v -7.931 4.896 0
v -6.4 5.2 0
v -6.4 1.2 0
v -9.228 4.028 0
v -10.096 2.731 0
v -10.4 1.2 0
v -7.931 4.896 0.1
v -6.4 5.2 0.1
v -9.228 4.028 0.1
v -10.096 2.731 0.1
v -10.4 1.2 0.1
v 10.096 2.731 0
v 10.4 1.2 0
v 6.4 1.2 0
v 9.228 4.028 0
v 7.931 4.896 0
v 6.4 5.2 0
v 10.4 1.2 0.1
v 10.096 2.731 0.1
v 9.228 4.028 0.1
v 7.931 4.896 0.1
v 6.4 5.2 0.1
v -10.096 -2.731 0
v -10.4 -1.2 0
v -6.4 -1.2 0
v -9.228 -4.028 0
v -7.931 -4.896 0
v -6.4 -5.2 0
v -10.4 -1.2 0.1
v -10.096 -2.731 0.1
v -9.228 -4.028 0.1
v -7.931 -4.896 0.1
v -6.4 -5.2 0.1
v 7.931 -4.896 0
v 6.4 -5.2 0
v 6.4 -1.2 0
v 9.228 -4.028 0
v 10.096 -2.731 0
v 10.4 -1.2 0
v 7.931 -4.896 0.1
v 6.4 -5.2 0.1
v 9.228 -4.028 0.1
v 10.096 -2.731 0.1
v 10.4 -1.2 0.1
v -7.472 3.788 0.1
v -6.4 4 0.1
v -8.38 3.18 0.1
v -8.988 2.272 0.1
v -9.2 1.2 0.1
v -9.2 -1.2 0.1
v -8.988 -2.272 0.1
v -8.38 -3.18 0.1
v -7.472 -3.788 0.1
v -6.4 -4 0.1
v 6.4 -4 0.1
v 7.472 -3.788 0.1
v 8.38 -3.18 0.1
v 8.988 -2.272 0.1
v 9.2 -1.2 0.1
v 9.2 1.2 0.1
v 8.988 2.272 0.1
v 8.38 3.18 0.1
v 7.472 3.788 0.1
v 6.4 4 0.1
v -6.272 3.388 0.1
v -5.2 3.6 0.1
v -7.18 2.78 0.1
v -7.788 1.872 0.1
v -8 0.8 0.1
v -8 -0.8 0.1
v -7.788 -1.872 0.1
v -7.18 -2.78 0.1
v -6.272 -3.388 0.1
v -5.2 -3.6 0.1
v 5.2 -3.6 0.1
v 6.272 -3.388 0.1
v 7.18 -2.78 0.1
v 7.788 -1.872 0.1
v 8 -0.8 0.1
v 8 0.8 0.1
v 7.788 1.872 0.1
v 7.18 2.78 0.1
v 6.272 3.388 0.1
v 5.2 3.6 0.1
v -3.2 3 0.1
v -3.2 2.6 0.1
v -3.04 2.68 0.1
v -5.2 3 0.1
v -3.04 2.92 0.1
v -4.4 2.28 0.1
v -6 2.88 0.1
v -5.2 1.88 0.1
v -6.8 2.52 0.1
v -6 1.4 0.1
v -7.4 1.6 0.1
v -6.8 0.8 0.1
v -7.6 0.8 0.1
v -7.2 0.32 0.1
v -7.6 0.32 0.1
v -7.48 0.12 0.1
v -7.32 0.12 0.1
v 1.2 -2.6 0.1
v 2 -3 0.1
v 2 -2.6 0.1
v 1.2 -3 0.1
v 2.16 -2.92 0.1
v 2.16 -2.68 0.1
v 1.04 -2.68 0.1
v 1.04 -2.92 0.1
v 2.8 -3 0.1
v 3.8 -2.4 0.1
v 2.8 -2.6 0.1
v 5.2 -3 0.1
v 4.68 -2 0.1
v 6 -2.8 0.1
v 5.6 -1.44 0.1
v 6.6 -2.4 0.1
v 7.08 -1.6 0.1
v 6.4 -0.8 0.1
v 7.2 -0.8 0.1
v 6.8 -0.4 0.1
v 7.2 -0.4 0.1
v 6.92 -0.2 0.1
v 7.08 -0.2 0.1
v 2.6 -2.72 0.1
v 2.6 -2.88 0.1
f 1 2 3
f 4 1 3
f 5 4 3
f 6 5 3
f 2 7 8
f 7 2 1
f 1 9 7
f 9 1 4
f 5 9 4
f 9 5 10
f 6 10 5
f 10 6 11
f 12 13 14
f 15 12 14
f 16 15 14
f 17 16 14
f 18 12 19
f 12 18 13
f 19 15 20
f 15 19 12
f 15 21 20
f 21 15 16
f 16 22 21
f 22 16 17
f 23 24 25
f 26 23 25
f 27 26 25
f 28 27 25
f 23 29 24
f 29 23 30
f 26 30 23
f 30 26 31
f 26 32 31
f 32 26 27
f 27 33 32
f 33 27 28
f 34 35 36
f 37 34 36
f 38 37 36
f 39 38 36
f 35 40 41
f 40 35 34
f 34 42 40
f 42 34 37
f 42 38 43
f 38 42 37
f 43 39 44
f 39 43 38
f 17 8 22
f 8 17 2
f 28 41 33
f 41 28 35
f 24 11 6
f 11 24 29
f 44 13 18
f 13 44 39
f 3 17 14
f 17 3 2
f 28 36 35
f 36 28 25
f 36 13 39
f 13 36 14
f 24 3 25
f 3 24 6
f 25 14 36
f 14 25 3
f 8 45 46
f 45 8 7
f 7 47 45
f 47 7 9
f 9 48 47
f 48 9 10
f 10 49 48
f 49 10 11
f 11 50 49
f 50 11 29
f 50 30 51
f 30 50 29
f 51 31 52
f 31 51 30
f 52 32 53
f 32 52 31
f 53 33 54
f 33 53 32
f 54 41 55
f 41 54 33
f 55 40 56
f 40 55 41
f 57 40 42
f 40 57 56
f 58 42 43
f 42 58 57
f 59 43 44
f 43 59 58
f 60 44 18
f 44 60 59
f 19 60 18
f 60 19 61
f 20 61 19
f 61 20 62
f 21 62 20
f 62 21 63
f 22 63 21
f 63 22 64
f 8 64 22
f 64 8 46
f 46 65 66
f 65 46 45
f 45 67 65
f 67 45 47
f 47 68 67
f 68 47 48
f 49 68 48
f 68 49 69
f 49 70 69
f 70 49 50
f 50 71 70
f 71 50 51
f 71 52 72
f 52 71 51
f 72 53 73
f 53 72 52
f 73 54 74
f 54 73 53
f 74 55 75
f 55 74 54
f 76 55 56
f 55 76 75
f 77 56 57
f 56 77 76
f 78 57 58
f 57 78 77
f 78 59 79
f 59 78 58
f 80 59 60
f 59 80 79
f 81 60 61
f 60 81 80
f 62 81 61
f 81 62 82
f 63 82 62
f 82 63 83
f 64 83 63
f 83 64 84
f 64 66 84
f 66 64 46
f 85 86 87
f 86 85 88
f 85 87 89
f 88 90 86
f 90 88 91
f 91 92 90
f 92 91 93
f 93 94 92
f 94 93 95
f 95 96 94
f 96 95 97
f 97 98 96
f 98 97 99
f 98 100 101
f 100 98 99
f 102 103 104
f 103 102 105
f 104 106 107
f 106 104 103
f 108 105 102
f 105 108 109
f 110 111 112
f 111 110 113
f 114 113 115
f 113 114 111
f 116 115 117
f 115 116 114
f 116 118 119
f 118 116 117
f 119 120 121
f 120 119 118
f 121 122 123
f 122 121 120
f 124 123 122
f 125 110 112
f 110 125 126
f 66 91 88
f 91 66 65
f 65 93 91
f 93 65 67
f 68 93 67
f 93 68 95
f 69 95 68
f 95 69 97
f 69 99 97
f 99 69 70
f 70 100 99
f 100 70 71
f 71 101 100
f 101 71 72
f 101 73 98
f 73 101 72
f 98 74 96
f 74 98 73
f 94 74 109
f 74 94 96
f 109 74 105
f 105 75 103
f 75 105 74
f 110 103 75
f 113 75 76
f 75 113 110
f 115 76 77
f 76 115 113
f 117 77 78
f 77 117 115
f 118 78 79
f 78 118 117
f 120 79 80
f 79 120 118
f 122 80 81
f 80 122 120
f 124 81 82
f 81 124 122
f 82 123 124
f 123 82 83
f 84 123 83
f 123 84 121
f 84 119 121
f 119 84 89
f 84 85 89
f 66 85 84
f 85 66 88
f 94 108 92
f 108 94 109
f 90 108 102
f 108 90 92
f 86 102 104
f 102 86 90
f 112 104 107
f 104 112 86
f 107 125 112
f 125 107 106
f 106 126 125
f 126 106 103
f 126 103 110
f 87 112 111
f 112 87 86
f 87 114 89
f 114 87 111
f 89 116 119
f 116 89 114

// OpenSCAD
// file: ../p/empty.scad
use <../lib.scad>
function ldraw_lib__empty() = [
// 0 Empty
// 0 Name: empty.dat
// 0 Author: Steffen [Steffen]
// 0 !LDRAW_ORG Primitive UPDATE 2015-01
// 0 !LICENSE Licensed under CC BY 4.0 : see CAreadme.txt
// 
// 0 BFC CERTIFY CCW
  [0,"BFC","CERTIFY"],
  [0,"BFC","CCW"],
// 
// 0 !HISTORY 2015-10-11 [PTadmin] Official Update 2015-01
// 
// 
// 0 // Tool MLCad cannot handle really empty files. This file is used as a workaround.
// 0 // It exceptionally contains forbidden non-LDRAW standard syntax to satisfy MLCad until it is fixed OR a different editor has become the de-facto LDRAW standard.
// 0 // The line being used here is an "impossible" conditional line which never should be visible,
// 0 // additionally hidden by a syntax explicitly hiding it from displaying.
// 
// 0 MLCAD HIDE 5 24 0 0 0 0.0001 0 0 0.0001 -0.0001 0 0 0 0
];
module ldraw_lib__empty(step=0, col=false, unit=2/5, alt=false, line=0.2, solid=!$preview)
    makepoly(ldraw_lib__empty(), step=step, col=col, unit=unit, alt=alt, line=line, solid=solid);
ldraw_lib__empty(line=0.2);
// file: ../p/1-16chrd.scad
use <../lib.scad>
use <empty.scad>
function ldraw_lib__1_16chrd() = [
// 0 Chord 0.0625
// 0 Name: 1-16chrd.dat
// 0 Author: Philippe Hurbain [Philo]
// 0 !LDRAW_ORG Primitive UPDATE 2015-01
// 0 !LICENSE Licensed under CC BY 4.0 : see CAreadme.txt
// 
// 0 BFC CERTIFY CCW
  [0,"BFC","CERTIFY"],
  [0,"BFC","CCW"],
// 
// 0 !HISTORY 2015-10-11 [PTadmin] Official Update 2015-01
// 
// 
// 0 // This file is intentionally empty because at the current \P resolution,
// 0 // an 1-16chrd is actually empty. However, this file still is present
// 0 // to allow tools to do primitives substition and fill in a real chrd here,
// 0 // or, if desired, to substitute this with the hi-res 48\1-16chrd.
// 
// 0 // This file is based on an idea by Darats at http://forums.ldraw.org/read.php?19,14500,14500#msg-14500
// 
// 1 16 0 0 0 1 0 0 0 1 0 0 0 1 empty.dat
  [1,16,0,0,0,1,0,0,0,1,0,0,0,1, ldraw_lib__empty()],
];
module ldraw_lib__1_16chrd(step=0, col=false, unit=2/5, alt=false, line=0.2, solid=!$preview)
    makepoly(ldraw_lib__1_16chrd(), step=step, col=col, unit=unit, alt=alt, line=line, solid=solid);
ldraw_lib__1_16chrd(line=0.2);
// file: ../p/1-4disc.scad
use <../lib.scad>
function ldraw_lib__1_4disc() = [
// 0 Disc 0.25
// 0 Name: 1-4disc.dat
// 0 Author: James Jessiman
// 0 !LDRAW_ORG Primitive UPDATE 2002-02
// 0 !LICENSE Licensed under CC BY 4.0 : see CAreadme.txt
// 
// 0 BFC CERTIFY CCW
  [0,"BFC","CERTIFY"],
  [0,"BFC","CCW"],
// 
// 0 !HISTORY 2002-03-23 [sbliss] Added BFC statement.
// 0 !HISTORY 2002-04-25 [PTadmin] Official Update 2002-02
// 0 !HISTORY 2007-06-22 [PTadmin] Header formatted for Contributor Agreement
// 0 !HISTORY 2008-07-01 [PTadmin] Official Update 2008-01
// 
// 
// 3 16 0 0 0 1 0 0 0.9239 0 0.3827
  [3,16,0,0,0,1,0,0,0.9239,0,0.3827],
// 3 16 0 0 0 0.9239 0 0.3827 0.7071 0 0.7071
  [3,16,0,0,0,0.9239,0,0.3827,0.7071,0,0.7071],
// 3 16 0 0 0 0.7071 0 0.7071 0.3827 0 0.9239
  [3,16,0,0,0,0.7071,0,0.7071,0.3827,0,0.9239],
// 3 16 0 0 0 0.3827 0 0.9239 0 0 1
  [3,16,0,0,0,0.3827,0,0.9239,0,0,1],
// 0
];
module ldraw_lib__1_4disc(step=0, col=false, unit=2/5, alt=false, line=0.2, solid=!$preview)
    makepoly(ldraw_lib__1_4disc(), step=step, col=col, unit=unit, alt=alt, line=line, solid=solid);
ldraw_lib__1_4disc(line=0.2);
// file: ../p/1-4cyli.scad
use <../lib.scad>
function ldraw_lib__1_4cyli() = [
// 0 Cylinder 0.25
// 0 Name: 1-4cyli.dat
// 0 Author: James Jessiman
// 0 !LDRAW_ORG Primitive UPDATE 2012-01
// 0 !LICENSE Licensed under CC BY 4.0 : see CAreadme.txt
// 
// 0 BFC CERTIFY CCW
  [0,"BFC","CERTIFY"],
  [0,"BFC","CCW"],
// 
// 0 !HISTORY 2002-03-23 [sbliss] Added BFC statement.
// 0 !HISTORY 2002-04-25 [PTadmin] Official Update 2002-02
// 0 !HISTORY 2007-06-22 [PTadmin] Header formatted for Contributor Agreement
// 0 !HISTORY 2008-07-01 [PTadmin] Official Update 2008-01
// 0 !HISTORY 2012-02-16 [Philo] Changed to CCW
// 0 !HISTORY 2012-03-30 [PTadmin] Official Update 2012-01
// 
// 
// 4 16 1 1 0 0.9239 1 0.3827 0.9239 0 0.3827 1 0 0
  [4,16,1,1,0,0.9239,1,0.3827,0.9239,0,0.3827,1,0,0],
// 5 24 1 0 0 1 1 0 0.9239 0 0.3827 1 0 -1
  [5,24,1,0,0,1,1,0,0.9239,0,0.3827,1,0,-1],
// 4 16 0.9239 1 0.3827 0.7071 1 0.7071 0.7071 0 0.7071 0.9239 0 0.3827
  [4,16,0.9239,1,0.3827,0.7071,1,0.7071,0.7071,0,0.7071,0.9239,0,0.3827],
// 5 24 0.9239 0 0.3827 0.9239 1 0.3827 0.7071 0 0.7071 1 0 0
  [5,24,0.9239,0,0.3827,0.9239,1,0.3827,0.7071,0,0.7071,1,0,0],
// 4 16 0.7071 1 0.7071 0.3827 1 0.9239 0.3827 0 0.9239 0.7071 0 0.7071
  [4,16,0.7071,1,0.7071,0.3827,1,0.9239,0.3827,0,0.9239,0.7071,0,0.7071],
// 5 24 0.7071 0 0.7071 0.7071 1 0.7071 0.3827 0 0.9239 0.9239 0 0.3827
  [5,24,0.7071,0,0.7071,0.7071,1,0.7071,0.3827,0,0.9239,0.9239,0,0.3827],
// 4 16 0.3827 1 0.9239 0 1 1 0 0 1 0.3827 0 0.9239
  [4,16,0.3827,1,0.9239,0,1,1,0,0,1,0.3827,0,0.9239],
// 5 24 0.3827 0 0.9239 0.3827 1 0.9239 0 0 1 0.7071 0 0.7071
  [5,24,0.3827,0,0.9239,0.3827,1,0.9239,0,0,1,0.7071,0,0.7071],
// 5 24 0 0 1 0 1 1 0.3827 0 0.9239 -1 0 1
  [5,24,0,0,1,0,1,1,0.3827,0,0.9239,-1,0,1],
];
module ldraw_lib__1_4cyli(step=0, col=false, unit=2/5, alt=false, line=0.2, solid=!$preview)
    makepoly(ldraw_lib__1_4cyli(), step=step, col=col, unit=unit, alt=alt, line=line, solid=solid);
ldraw_lib__1_4cyli(line=0.2);
// file: ../p/1-4ering.scad
use <../lib.scad>
use <1-16chrd.scad>
function ldraw_lib__1_4ering() = [
// 0 Adapter Ring Triangles to Normal 0.25
// 0 Name: 1-4ering.dat
// 0 Author: Steffen [Steffen]
// 0 !LDRAW_ORG Primitive UPDATE 2015-01
// 0 !LICENSE Licensed under CC BY 4.0 : see CAreadme.txt
// 
// 0 BFC CERTIFY CCW
  [0,"BFC","CERTIFY"],
  [0,"BFC","CCW"],
// 
// 0 !HISTORY 2015-10-11 [PTadmin] Official Update 2015-01
// 
// 
// 0 // This file uses 1-16chrd (actually empty). It allows
// 0 // tools to do primitives substition and fill in a ring of chrd here,
// 0 // or, if desired, to substitute this with the hi-res 48\1-16chrd.
// 0 // This file is based on an idea by Darats at http://forums.ldraw.org/read.php?19,14500,14500#msg-14500
// 
// 1 16 0 0 0 1 0 0 0 1 0 0 0 1 1-16chrd.dat
  [1,16,0,0,0,1,0,0,0,1,0,0,0,1, ldraw_lib__1_16chrd()],
// 1 16 0 0 0 0.38268 0 -0.92388 0 1 0 0.92388 0 0.38268 1-16chrd.dat
  [1,16,0,0,0,0.38268,0,-0.92388,0,1,0,0.92388,0,0.38268, ldraw_lib__1_16chrd()],
// 1 16 0 0 0 0.70711 0 -0.70711 0 1 0 0.70711 0 0.70711 1-16chrd.dat
  [1,16,0,0,0,0.70711,0,-0.70711,0,1,0,0.70711,0,0.70711, ldraw_lib__1_16chrd()],
// 1 16 0 0 0 0.92388 0 -0.38268 0 1 0 0.38268 0 0.92388 1-16chrd.dat
  [1,16,0,0,0,0.92388,0,-0.38268,0,1,0,0.38268,0,0.92388, ldraw_lib__1_16chrd()],
];
module ldraw_lib__1_4ering(step=0, col=false, unit=2/5, alt=false, line=0.2, solid=!$preview)
    makepoly(ldraw_lib__1_4ering(), step=step, col=col, unit=unit, alt=alt, line=line, solid=solid);
ldraw_lib__1_4ering(line=0.2);
// file: ../p/1-4cylc3.scad
use <../lib.scad>
use <1-4cyli.scad>
use <1-4disc.scad>
function ldraw_lib__1_4cylc3() = [
// 0 Cylinder Closed 0.25 without Top or Bottom Edge Lines
// 0 Name: 1-4cylc3.dat
// 0 Author: Chris Dee [cwdee]
// 0 !LDRAW_ORG Primitive UPDATE 2018-01
// 0 !LICENSE Licensed under CC BY 4.0 : see CAreadme.txt
// 
// 0 BFC CERTIFY CCW
  [0,"BFC","CERTIFY"],
  [0,"BFC","CCW"],
// 
// 0 !HISTORY 2018-01-30 [PTadmin] Official Update 2018-01
// 
// 
// 1 16 0 0 0 1 0 0 0 1 0 0 0 1 1-4disc.dat
  [1,16,0,0,0,1,0,0,0,1,0,0,0,1, ldraw_lib__1_4disc()],
// 1 16 0 0 0 1 0 0 0 1 0 0 0 1 1-4cyli.dat
  [1,16,0,0,0,1,0,0,0,1,0,0,0,1, ldraw_lib__1_4cyli()],
// 0
];
module ldraw_lib__1_4cylc3(step=0, col=false, unit=2/5, alt=false, line=0.2, solid=!$preview)
    makepoly(ldraw_lib__1_4cylc3(), step=step, col=col, unit=unit, alt=alt, line=line, solid=solid);
ldraw_lib__1_4cylc3(line=0.2);
// main file
use <../lib.scad>
use <../p/1-4cylc3.scad>
use <../p/1-4ering.scad>
function ldraw_lib__4620857g() = [
// 0 Sticker  1.3 x  2.6 Rounded Rectangle with Bright Pink Window
// 0 Name: 4620857g.dat
// 0 Author: Takeshi Takahashi [RainbowDolphin]
// 0 !LDRAW_ORG Part UPDATE 2024-10
// 0 !LICENSE Licensed under CC BY 4.0 : see CAreadme.txt
// 
// 0 BFC CERTIFY CCW
  [0,"BFC","CERTIFY"],
  [0,"BFC","CCW"],
// 
// 0 !KEYWORDS Bricklink 3186stk01, Brickowl 621063, Emma, Horse
// 0 !KEYWORDS Rebrickable 10095457, Set 3186, Trailer
// 
// 0 !HISTORY 2024-12-01 [OrionP] Official Update 2024-10
// 
// 
// 1 16 -16 0 3 0 0 -10 0 -.25 0 10 0 0 1-4cylc3.dat
  [1,16,-16,0,3,0,0,-10,0,-.25,0,10,0,0, ldraw_lib__1_4cylc3()],
// 1 16 16 0 3 10 0 0 0 -.25 0 0 0 10 1-4cylc3.dat
  [1,16,16,0,3,10,0,0,0,-.25,0,0,0,10, ldraw_lib__1_4cylc3()],
// 1 16 -16 0 -3 -10 0 0 0 -.25 0 0 0 -10 1-4cylc3.dat
  [1,16,-16,0,-3,-10,0,0,0,-.25,0,0,0,-10, ldraw_lib__1_4cylc3()],
// 1 16 16 0 -3 0 0 10 0 -.25 0 -10 0 0 1-4cylc3.dat
  [1,16,16,0,-3,0,0,10,0,-.25,0,-10,0,0, ldraw_lib__1_4cylc3()],
// 1 16 -16 0 3 0 0 -10 0 1 0 10 0 0 1-4ering.dat
  [1,16,-16,0,3,0,0,-10,0,1,0,10,0,0, ldraw_lib__1_4ering()],
// 1 16 16 0 3 10 0 0 0 1 0 0 0 10 1-4ering.dat
  [1,16,16,0,3,10,0,0,0,1,0,0,0,10, ldraw_lib__1_4ering()],
// 1 16 -16 0 -3 -10 0 0 0 1 0 0 0 -10 1-4ering.dat
  [1,16,-16,0,-3,-10,0,0,0,1,0,0,0,-10, ldraw_lib__1_4ering()],
// 1 16 16 0 -3 0 0 10 0 1 0 -10 0 0 1-4ering.dat
  [1,16,16,0,-3,0,0,10,0,1,0,-10,0,0, ldraw_lib__1_4ering()],
// 4 16 -16 -.25 13 16 -.25 13 16 0 13 -16 0 13
  [4,16,-16,-.25,13,16,-.25,13,16,0,13,-16,0,13],
// 4 16 16 0 -13 16 -.25 -13 -16 -.25 -13 -16 0 -13
  [4,16,16,0,-13,16,-.25,-13,-16,-.25,-13,-16,0,-13],
// 4 16 -26 -.25 3 -26 0 3 -26 0 -3 -26 -.25 -3
  [4,16,-26,-.25,3,-26,0,3,-26,0,-3,-26,-.25,-3],
// 4 16 26 0 -3 26 0 3 26 -.25 3 26 -.25 -3
  [4,16,26,0,-3,26,0,3,26,-.25,3,26,-.25,-3],
// 4 16 -16 0 13 16 0 13 16 0 3 -16 0 3
  [4,16,-16,0,13,16,0,13,16,0,3,-16,0,3],
// 4 16 16 0 -3 16 0 -13 -16 0 -13 -16 0 -3
  [4,16,16,0,-3,16,0,-13,-16,0,-13,-16,0,-3],
// 4 16 16 0 -3 16 0 3 26 0 3 26 0 -3
  [4,16,16,0,-3,16,0,3,26,0,3,26,0,-3],
// 4 16 -26 0 3 -16 0 3 -16 0 -3 -26 0 -3
  [4,16,-26,0,3,-16,0,3,-16,0,-3,-26,0,-3],
// 4 16 16 0 3 16 0 -3 -16 0 -3 -16 0 3
  [4,16,16,0,3,16,0,-3,-16,0,-3,-16,0,3],
// 4 320 -16 -.25 10 -16 -.25 13 -19.827 -.25 12.239 -18.68 -.25 9.47
  [4,320,-16,-.25,10,-16,-.25,13,-19.827,-.25,12.239,-18.68,-.25,9.47],
// 4 320 -18.68 -.25 9.47 -19.827 -.25 12.239 -23.071 -.25 10.071 -20.95 -.25 7.95
  [4,320,-18.68,-.25,9.47,-19.827,-.25,12.239,-23.071,-.25,10.071,-20.95,-.25,7.95],
// 4 320 -20.95 -.25 7.95 -23.071 -.25 10.071 -25.239 -.25 6.827 -22.47 -.25 5.68
  [4,320,-20.95,-.25,7.95,-23.071,-.25,10.071,-25.239,-.25,6.827,-22.47,-.25,5.68],
// 4 320 -22.47 -.25 5.68 -25.239 -.25 6.827 -26 -.25 3 -23 -.25 3
  [4,320,-22.47,-.25,5.68,-25.239,-.25,6.827,-26,-.25,3,-23,-.25,3],
// 4 320 -23 -.25 3 -26 -.25 3 -26 -.25 -3 -23 -.25 -3
  [4,320,-23,-.25,3,-26,-.25,3,-26,-.25,-3,-23,-.25,-3],
// 4 320 -23 -.25 -3 -26 -.25 -3 -25.239 -.25 -6.827 -22.47 -.25 -5.68
  [4,320,-23,-.25,-3,-26,-.25,-3,-25.239,-.25,-6.827,-22.47,-.25,-5.68],
// 4 320 -22.47 -.25 -5.68 -25.239 -.25 -6.827 -23.071 -.25 -10.071 -20.95 -.25 -7.95
  [4,320,-22.47,-.25,-5.68,-25.239,-.25,-6.827,-23.071,-.25,-10.071,-20.95,-.25,-7.95],
// 4 320 -20.95 -.25 -7.95 -23.071 -.25 -10.071 -19.827 -.25 -12.239 -18.68 -.25 -9.47
  [4,320,-20.95,-.25,-7.95,-23.071,-.25,-10.071,-19.827,-.25,-12.239,-18.68,-.25,-9.47],
// 4 320 -18.68 -.25 -9.47 -19.827 -.25 -12.239 -16 -.25 -13 -16 -.25 -10
  [4,320,-18.68,-.25,-9.47,-19.827,-.25,-12.239,-16,-.25,-13,-16,-.25,-10],
// 4 320 -16 -.25 -10 -16 -.25 -13 16 -.25 -13 16 -.25 -10
  [4,320,-16,-.25,-10,-16,-.25,-13,16,-.25,-13,16,-.25,-10],
// 4 320 16 -.25 -10 16 -.25 -13 19.827 -.25 -12.239 18.68 -.25 -9.47
  [4,320,16,-.25,-10,16,-.25,-13,19.827,-.25,-12.239,18.68,-.25,-9.47],
// 4 320 18.68 -.25 -9.47 19.827 -.25 -12.239 23.071 -.25 -10.071 20.95 -.25 -7.95
  [4,320,18.68,-.25,-9.47,19.827,-.25,-12.239,23.071,-.25,-10.071,20.95,-.25,-7.95],
// 4 320 20.95 -.25 -7.95 23.071 -.25 -10.071 25.239 -.25 -6.827 22.47 -.25 -5.68
  [4,320,20.95,-.25,-7.95,23.071,-.25,-10.071,25.239,-.25,-6.827,22.47,-.25,-5.68],
// 4 320 22.47 -.25 -5.68 25.239 -.25 -6.827 26 -.25 -3 23 -.25 -3
  [4,320,22.47,-.25,-5.68,25.239,-.25,-6.827,26,-.25,-3,23,-.25,-3],
// 4 320 23 -.25 -3 26 -.25 -3 26 -.25 3 23 -.25 3
  [4,320,23,-.25,-3,26,-.25,-3,26,-.25,3,23,-.25,3],
// 4 320 23 -.25 3 26 -.25 3 25.239 -.25 6.827 22.47 -.25 5.68
  [4,320,23,-.25,3,26,-.25,3,25.239,-.25,6.827,22.47,-.25,5.68],
// 4 320 22.47 -.25 5.68 25.239 -.25 6.827 23.071 -.25 10.071 20.95 -.25 7.95
  [4,320,22.47,-.25,5.68,25.239,-.25,6.827,23.071,-.25,10.071,20.95,-.25,7.95],
// 4 320 20.95 -.25 7.95 23.071 -.25 10.071 19.827 -.25 12.239 18.68 -.25 9.47
  [4,320,20.95,-.25,7.95,23.071,-.25,10.071,19.827,-.25,12.239,18.68,-.25,9.47],
// 4 320 18.68 -.25 9.47 19.827 -.25 12.239 16 -.25 13 16 -.25 10
  [4,320,18.68,-.25,9.47,19.827,-.25,12.239,16,-.25,13,16,-.25,10],
// 4 320 16 -.25 10 16 -.25 13 -16 -.25 13 -16 -.25 10
  [4,320,16,-.25,10,16,-.25,13,-16,-.25,13,-16,-.25,10],
// 4 30 -15.68 -.25 8.47 -13 -.25 9 -16 -.25 10 -18.68 -.25 9.47
  [4,30,-15.68,-.25,8.47,-13,-.25,9,-16,-.25,10,-18.68,-.25,9.47],
// 4 30 -17.95 -.25 6.95 -15.68 -.25 8.47 -18.68 -.25 9.47 -20.95 -.25 7.95
  [4,30,-17.95,-.25,6.95,-15.68,-.25,8.47,-18.68,-.25,9.47,-20.95,-.25,7.95],
// 4 30 -19.47 -.25 4.68 -17.95 -.25 6.95 -20.95 -.25 7.95 -22.47 -.25 5.68
  [4,30,-19.47,-.25,4.68,-17.95,-.25,6.95,-20.95,-.25,7.95,-22.47,-.25,5.68],
// 4 30 -20 -.25 2 -19.47 -.25 4.68 -22.47 -.25 5.68 -23 -.25 3
  [4,30,-20,-.25,2,-19.47,-.25,4.68,-22.47,-.25,5.68,-23,-.25,3],
// 4 30 -20 -.25 -2 -20 -.25 2 -23 -.25 3 -23 -.25 -3
  [4,30,-20,-.25,-2,-20,-.25,2,-23,-.25,3,-23,-.25,-3],
// 4 30 -19.47 -.25 -4.68 -20 -.25 -2 -23 -.25 -3 -22.47 -.25 -5.68
  [4,30,-19.47,-.25,-4.68,-20,-.25,-2,-23,-.25,-3,-22.47,-.25,-5.68],
// 4 30 -17.95 -.25 -6.95 -19.47 -.25 -4.68 -22.47 -.25 -5.68 -20.95 -.25 -7.95
  [4,30,-17.95,-.25,-6.95,-19.47,-.25,-4.68,-22.47,-.25,-5.68,-20.95,-.25,-7.95],
// 4 30 -15.68 -.25 -8.47 -17.95 -.25 -6.95 -20.95 -.25 -7.95 -18.68 -.25 -9.47
  [4,30,-15.68,-.25,-8.47,-17.95,-.25,-6.95,-20.95,-.25,-7.95,-18.68,-.25,-9.47],
// 4 30 -13 -.25 -9 -15.68 -.25 -8.47 -18.68 -.25 -9.47 -16 -.25 -10
  [4,30,-13,-.25,-9,-15.68,-.25,-8.47,-18.68,-.25,-9.47,-16,-.25,-10],
// 4 30 13 -.25 -9 -13 -.25 -9 -16 -.25 -10 16 -.25 -10
  [4,30,13,-.25,-9,-13,-.25,-9,-16,-.25,-10,16,-.25,-10],
// 4 30 15.68 -.25 -8.47 13 -.25 -9 16 -.25 -10 18.68 -.25 -9.47
  [4,30,15.68,-.25,-8.47,13,-.25,-9,16,-.25,-10,18.68,-.25,-9.47],
// 4 30 17.95 -.25 -6.95 15.68 -.25 -8.47 18.68 -.25 -9.47 20.95 -.25 -7.95
  [4,30,17.95,-.25,-6.95,15.68,-.25,-8.47,18.68,-.25,-9.47,20.95,-.25,-7.95],
// 4 30 19.47 -.25 -4.68 17.95 -.25 -6.95 20.95 -.25 -7.95 22.47 -.25 -5.68
  [4,30,19.47,-.25,-4.68,17.95,-.25,-6.95,20.95,-.25,-7.95,22.47,-.25,-5.68],
// 4 30 20 -.25 -2 19.47 -.25 -4.68 22.47 -.25 -5.68 23 -.25 -3
  [4,30,20,-.25,-2,19.47,-.25,-4.68,22.47,-.25,-5.68,23,-.25,-3],
// 4 30 20 -.25 2 20 -.25 -2 23 -.25 -3 23 -.25 3
  [4,30,20,-.25,2,20,-.25,-2,23,-.25,-3,23,-.25,3],
// 4 30 19.47 -.25 4.68 20 -.25 2 23 -.25 3 22.47 -.25 5.68
  [4,30,19.47,-.25,4.68,20,-.25,2,23,-.25,3,22.47,-.25,5.68],
// 4 30 17.95 -.25 6.95 19.47 -.25 4.68 22.47 -.25 5.68 20.95 -.25 7.95
  [4,30,17.95,-.25,6.95,19.47,-.25,4.68,22.47,-.25,5.68,20.95,-.25,7.95],
// 4 30 15.68 -.25 8.47 17.95 -.25 6.95 20.95 -.25 7.95 18.68 -.25 9.47
  [4,30,15.68,-.25,8.47,17.95,-.25,6.95,20.95,-.25,7.95,18.68,-.25,9.47],
// 4 30 13 -.25 9 15.68 -.25 8.47 18.68 -.25 9.47 16 -.25 10
  [4,30,13,-.25,9,15.68,-.25,8.47,18.68,-.25,9.47,16,-.25,10],
// 4 30 -13 -.25 9 13 -.25 9 16 -.25 10 -16 -.25 10
  [4,30,-13,-.25,9,13,-.25,9,16,-.25,10,-16,-.25,10],
// 4 15 -8 -.25 7.5 -13 -.25 7.5 -8 -.25 6.5 -7.6 -.25 6.7
  [4,15,-8,-.25,7.5,-13,-.25,7.5,-8,-.25,6.5,-7.6,-.25,6.7],
// 3 15 -8 -.25 7.5 -7.6 -.25 6.7 -7.6 -.25 7.3
  [3,15,-8,-.25,7.5,-7.6,-.25,6.7,-7.6,-.25,7.3],
// 4 15 -11 -.25 5.7 -8 -.25 6.5 -13 -.25 7.5 -15 -.25 7.2
  [4,15,-11,-.25,5.7,-8,-.25,6.5,-13,-.25,7.5,-15,-.25,7.2],
// 4 15 -13 -.25 4.7 -11 -.25 5.7 -15 -.25 7.2 -17 -.25 6.3
  [4,15,-13,-.25,4.7,-11,-.25,5.7,-15,-.25,7.2,-17,-.25,6.3],
// 4 15 -15 -.25 3.5 -13 -.25 4.7 -17 -.25 6.3 -18.5 -.25 4
  [4,15,-15,-.25,3.5,-13,-.25,4.7,-17,-.25,6.3,-18.5,-.25,4],
// 4 15 -17 -.25 2 -15 -.25 3.5 -18.5 -.25 4 -19 -.25 2
  [4,15,-17,-.25,2,-15,-.25,3.5,-18.5,-.25,4,-19,-.25,2],
// 4 15 -18 -.25 .8 -17 -.25 2 -19 -.25 2 -19 -.25 .8
  [4,15,-18,-.25,.8,-17,-.25,2,-19,-.25,2,-19,-.25,.8],
// 4 15 -18 -.25 .8 -19 -.25 .8 -18.7 -.25 .3 -18.3 -.25 .3
  [4,15,-18,-.25,.8,-19,-.25,.8,-18.7,-.25,.3,-18.3,-.25,.3],
// 4 15 3 -.25 -6.5 3 -.25 -7.5 5 -.25 -7.5 5 -.25 -6.5
  [4,15,3,-.25,-6.5,3,-.25,-7.5,5,-.25,-7.5,5,-.25,-6.5],
// 4 15 5.4 -.25 -6.7 5 -.25 -6.5 5 -.25 -7.5 5.4 -.25 -7.3
  [4,15,5.4,-.25,-6.7,5,-.25,-6.5,5,-.25,-7.5,5.4,-.25,-7.3],
// 4 15 3 -.25 -7.5 3 -.25 -6.5 2.6 -.25 -6.7 2.6 -.25 -7.3
  [4,15,3,-.25,-7.5,3,-.25,-6.5,2.6,-.25,-6.7,2.6,-.25,-7.3],
// 4 15 7 -.25 -6.5 7 -.25 -7.5 13 -.25 -7.5 9.5 -.25 -6
  [4,15,7,-.25,-6.5,7,-.25,-7.5,13,-.25,-7.5,9.5,-.25,-6],
// 4 15 9.5 -.25 -6 13 -.25 -7.5 15 -.25 -7 11.7 -.25 -5
  [4,15,9.5,-.25,-6,13,-.25,-7.5,15,-.25,-7,11.7,-.25,-5],
// 4 15 11.7 -.25 -5 15 -.25 -7 16.5 -.25 -6 14 -.25 -3.6
  [4,15,11.7,-.25,-5,15,-.25,-7,16.5,-.25,-6,14,-.25,-3.6],
// 4 15 14 -.25 -3.6 16.5 -.25 -6 17.7 -.25 -4 16 -.25 -2
  [4,15,14,-.25,-3.6,16.5,-.25,-6,17.7,-.25,-4,16,-.25,-2],
// 4 15 16 -.25 -2 17.7 -.25 -4 18 -.25 -2 17 -.25 -1
  [4,15,16,-.25,-2,17.7,-.25,-4,18,-.25,-2,17,-.25,-1],
// 4 15 17 -.25 -1 18 -.25 -2 18 -.25 -1 17.3 -.25 -.5
  [4,15,17,-.25,-1,18,-.25,-2,18,-.25,-1,17.3,-.25,-.5],
// 3 15 17.7 -.25 -.5 17.3 -.25 -.5 18 -.25 -1
  [3,15,17.7,-.25,-.5,17.3,-.25,-.5,18,-.25,-1],
// 4 15 6.5 -.25 -7.2 7 -.25 -7.5 7 -.25 -6.5 6.5 -.25 -6.8
  [4,15,6.5,-.25,-7.2,7,-.25,-7.5,7,-.25,-6.5,6.5,-.25,-6.8],
// 4 29 -13 -.25 7.5 -13 -.25 9 -15.68 -.25 8.47 -15 -.25 7.2
  [4,29,-13,-.25,7.5,-13,-.25,9,-15.68,-.25,8.47,-15,-.25,7.2],
// 4 29 -15 -.25 7.2 -15.68 -.25 8.47 -17.95 -.25 6.95 -17 -.25 6.3
  [4,29,-15,-.25,7.2,-15.68,-.25,8.47,-17.95,-.25,6.95,-17,-.25,6.3],
// 4 29 -17 -.25 6.3 -17.95 -.25 6.95 -19.47 -.25 4.68 -18.5 -.25 4
  [4,29,-17,-.25,6.3,-17.95,-.25,6.95,-19.47,-.25,4.68,-18.5,-.25,4],
// 4 29 -18.5 -.25 4 -19.47 -.25 4.68 -20 -.25 2 -19 -.25 2
  [4,29,-18.5,-.25,4,-19.47,-.25,4.68,-20,-.25,2,-19,-.25,2],
// 4 29 -19 -.25 .8 -19 -.25 2 -20 -.25 2 -20 -.25 -2
  [4,29,-19,-.25,.8,-19,-.25,2,-20,-.25,2,-20,-.25,-2],
// 4 29 -18.7 -.25 .3 -19 -.25 .8 -20 -.25 -2 -19.47 -.25 -4.68
  [4,29,-18.7,-.25,.3,-19,-.25,.8,-20,-.25,-2,-19.47,-.25,-4.68],
// 4 29 -18.3 -.25 .3 -18.7 -.25 .3 -19.47 -.25 -4.68 -17.95 -.25 -6.95
  [4,29,-18.3,-.25,.3,-18.7,-.25,.3,-19.47,-.25,-4.68,-17.95,-.25,-6.95],
// 4 29 -18 -.25 .8 -18.3 -.25 .3 -17.95 -.25 -6.95 -15.68 -.25 -8.47
  [4,29,-18,-.25,.8,-18.3,-.25,.3,-17.95,-.25,-6.95,-15.68,-.25,-8.47],
// 4 29 -17 -.25 2 -18 -.25 .8 -15.68 -.25 -8.47 -13 -.25 -9
  [4,29,-17,-.25,2,-18,-.25,.8,-15.68,-.25,-8.47,-13,-.25,-9],
// 4 29 -15 -.25 3.5 -17 -.25 2 -13 -.25 -9 2.6 -.25 -7.3
  [4,29,-15,-.25,3.5,-17,-.25,2,-13,-.25,-9,2.6,-.25,-7.3],
// 3 29 2.6 -.25 -7.3 -13 -.25 -9 3 -.25 -7.5
  [3,29,2.6,-.25,-7.3,-13,-.25,-9,3,-.25,-7.5],
// 4 29 3 -.25 -7.5 -13 -.25 -9 13 -.25 -9 5 -.25 -7.5
  [4,29,3,-.25,-7.5,-13,-.25,-9,13,-.25,-9,5,-.25,-7.5],
// 3 29 7 -.25 -7.5 5 -.25 -7.5 13 -.25 -9
  [3,29,7,-.25,-7.5,5,-.25,-7.5,13,-.25,-9],
// 4 29 13 -.25 -7.5 7 -.25 -7.5 13 -.25 -9 15.68 -.25 -8.47
  [4,29,13,-.25,-7.5,7,-.25,-7.5,13,-.25,-9,15.68,-.25,-8.47],
// 4 29 15 -.25 -7 13 -.25 -7.5 15.68 -.25 -8.47 17.95 -.25 -6.95
  [4,29,15,-.25,-7,13,-.25,-7.5,15.68,-.25,-8.47,17.95,-.25,-6.95],
// 4 29 16.5 -.25 -6 15 -.25 -7 17.95 -.25 -6.95 19.47 -.25 -4.68
  [4,29,16.5,-.25,-6,15,-.25,-7,17.95,-.25,-6.95,19.47,-.25,-4.68],
// 4 29 17.7 -.25 -4 16.5 -.25 -6 19.47 -.25 -4.68 20 -.25 -2
  [4,29,17.7,-.25,-4,16.5,-.25,-6,19.47,-.25,-4.68,20,-.25,-2],
// 4 29 18 -.25 -2 17.7 -.25 -4 20 -.25 -2 20 -.25 2
  [4,29,18,-.25,-2,17.7,-.25,-4,20,-.25,-2,20,-.25,2],
// 4 29 18 -.25 -1 18 -.25 -2 20 -.25 2 19.47 -.25 4.68
  [4,29,18,-.25,-1,18,-.25,-2,20,-.25,2,19.47,-.25,4.68],
// 4 29 17.7 -.25 -.5 18 -.25 -1 19.47 -.25 4.68 17.95 -.25 6.95
  [4,29,17.7,-.25,-.5,18,-.25,-1,19.47,-.25,4.68,17.95,-.25,6.95],
// 4 29 17.3 -.25 -.5 17.7 -.25 -.5 17.95 -.25 6.95 15.68 -.25 8.47
  [4,29,17.3,-.25,-.5,17.7,-.25,-.5,17.95,-.25,6.95,15.68,-.25,8.47],
// 4 29 17 -.25 -1 17.3 -.25 -.5 15.68 -.25 8.47 13 -.25 9
  [4,29,17,-.25,-1,17.3,-.25,-.5,15.68,-.25,8.47,13,-.25,9],
// 4 29 16 -.25 -2 17 -.25 -1 13 -.25 9 -7.6 -.25 7.3
  [4,29,16,-.25,-2,17,-.25,-1,13,-.25,9,-7.6,-.25,7.3],
// 3 29 13 -.25 9 -8 -.25 7.5 -7.6 -.25 7.3
  [3,29,13,-.25,9,-8,-.25,7.5,-7.6,-.25,7.3],
// 4 29 -8 -.25 7.5 13 -.25 9 -13 -.25 9 -13 -.25 7.5
  [4,29,-8,-.25,7.5,13,-.25,9,-13,-.25,9,-13,-.25,7.5],
// 4 29 -15 -.25 3.5 2.6 -.25 -7.3 2.6 -.25 -6.7 -13 -.25 4.7
  [4,29,-15,-.25,3.5,2.6,-.25,-7.3,2.6,-.25,-6.7,-13,-.25,4.7],
// 4 29 -13 -.25 4.7 2.6 -.25 -6.7 3 -.25 -6.5 -11 -.25 5.7
  [4,29,-13,-.25,4.7,2.6,-.25,-6.7,3,-.25,-6.5,-11,-.25,5.7],
// 4 29 -11 -.25 5.7 3 -.25 -6.5 5 -.25 -6.5 -8 -.25 6.5
  [4,29,-11,-.25,5.7,3,-.25,-6.5,5,-.25,-6.5,-8,-.25,6.5],
// 4 29 7 -.25 -6.5 -8 -.25 6.5 5 -.25 -6.5 5.4 -.25 -6.7
  [4,29,7,-.25,-6.5,-8,-.25,6.5,5,-.25,-6.5,5.4,-.25,-6.7],
// 4 29 6.5 -.25 -6.8 7 -.25 -6.5 5.4 -.25 -6.7 5.4 -.25 -7.3
  [4,29,6.5,-.25,-6.8,7,-.25,-6.5,5.4,-.25,-6.7,5.4,-.25,-7.3],
// 4 29 6.5 -.25 -7.2 6.5 -.25 -6.8 5.4 -.25 -7.3 5 -.25 -7.5
  [4,29,6.5,-.25,-7.2,6.5,-.25,-6.8,5.4,-.25,-7.3,5,-.25,-7.5],
// 3 29 6.5 -.25 -7.2 5 -.25 -7.5 7 -.25 -7.5
  [3,29,6.5,-.25,-7.2,5,-.25,-7.5,7,-.25,-7.5],
// 4 29 -7.6 -.25 6.7 -8 -.25 6.5 7 -.25 -6.5 9.5 -.25 -6
  [4,29,-7.6,-.25,6.7,-8,-.25,6.5,7,-.25,-6.5,9.5,-.25,-6],
// 4 29 -7.6 -.25 7.3 -7.6 -.25 6.7 9.5 -.25 -6 11.7 -.25 -5
  [4,29,-7.6,-.25,7.3,-7.6,-.25,6.7,9.5,-.25,-6,11.7,-.25,-5],
// 4 29 -7.6 -.25 7.3 11.7 -.25 -5 14 -.25 -3.6 16 -.25 -2
  [4,29,-7.6,-.25,7.3,11.7,-.25,-5,14,-.25,-3.6,16,-.25,-2],
];
module ldraw_lib__4620857g(step=0, col=false, unit=2/5, alt=false, line=0.2, solid=!$preview)
    makepoly(ldraw_lib__4620857g(), step=step, col=col, unit=unit, alt=alt, line=line, solid=solid);
ldraw_lib__4620857g(line=0.2);
